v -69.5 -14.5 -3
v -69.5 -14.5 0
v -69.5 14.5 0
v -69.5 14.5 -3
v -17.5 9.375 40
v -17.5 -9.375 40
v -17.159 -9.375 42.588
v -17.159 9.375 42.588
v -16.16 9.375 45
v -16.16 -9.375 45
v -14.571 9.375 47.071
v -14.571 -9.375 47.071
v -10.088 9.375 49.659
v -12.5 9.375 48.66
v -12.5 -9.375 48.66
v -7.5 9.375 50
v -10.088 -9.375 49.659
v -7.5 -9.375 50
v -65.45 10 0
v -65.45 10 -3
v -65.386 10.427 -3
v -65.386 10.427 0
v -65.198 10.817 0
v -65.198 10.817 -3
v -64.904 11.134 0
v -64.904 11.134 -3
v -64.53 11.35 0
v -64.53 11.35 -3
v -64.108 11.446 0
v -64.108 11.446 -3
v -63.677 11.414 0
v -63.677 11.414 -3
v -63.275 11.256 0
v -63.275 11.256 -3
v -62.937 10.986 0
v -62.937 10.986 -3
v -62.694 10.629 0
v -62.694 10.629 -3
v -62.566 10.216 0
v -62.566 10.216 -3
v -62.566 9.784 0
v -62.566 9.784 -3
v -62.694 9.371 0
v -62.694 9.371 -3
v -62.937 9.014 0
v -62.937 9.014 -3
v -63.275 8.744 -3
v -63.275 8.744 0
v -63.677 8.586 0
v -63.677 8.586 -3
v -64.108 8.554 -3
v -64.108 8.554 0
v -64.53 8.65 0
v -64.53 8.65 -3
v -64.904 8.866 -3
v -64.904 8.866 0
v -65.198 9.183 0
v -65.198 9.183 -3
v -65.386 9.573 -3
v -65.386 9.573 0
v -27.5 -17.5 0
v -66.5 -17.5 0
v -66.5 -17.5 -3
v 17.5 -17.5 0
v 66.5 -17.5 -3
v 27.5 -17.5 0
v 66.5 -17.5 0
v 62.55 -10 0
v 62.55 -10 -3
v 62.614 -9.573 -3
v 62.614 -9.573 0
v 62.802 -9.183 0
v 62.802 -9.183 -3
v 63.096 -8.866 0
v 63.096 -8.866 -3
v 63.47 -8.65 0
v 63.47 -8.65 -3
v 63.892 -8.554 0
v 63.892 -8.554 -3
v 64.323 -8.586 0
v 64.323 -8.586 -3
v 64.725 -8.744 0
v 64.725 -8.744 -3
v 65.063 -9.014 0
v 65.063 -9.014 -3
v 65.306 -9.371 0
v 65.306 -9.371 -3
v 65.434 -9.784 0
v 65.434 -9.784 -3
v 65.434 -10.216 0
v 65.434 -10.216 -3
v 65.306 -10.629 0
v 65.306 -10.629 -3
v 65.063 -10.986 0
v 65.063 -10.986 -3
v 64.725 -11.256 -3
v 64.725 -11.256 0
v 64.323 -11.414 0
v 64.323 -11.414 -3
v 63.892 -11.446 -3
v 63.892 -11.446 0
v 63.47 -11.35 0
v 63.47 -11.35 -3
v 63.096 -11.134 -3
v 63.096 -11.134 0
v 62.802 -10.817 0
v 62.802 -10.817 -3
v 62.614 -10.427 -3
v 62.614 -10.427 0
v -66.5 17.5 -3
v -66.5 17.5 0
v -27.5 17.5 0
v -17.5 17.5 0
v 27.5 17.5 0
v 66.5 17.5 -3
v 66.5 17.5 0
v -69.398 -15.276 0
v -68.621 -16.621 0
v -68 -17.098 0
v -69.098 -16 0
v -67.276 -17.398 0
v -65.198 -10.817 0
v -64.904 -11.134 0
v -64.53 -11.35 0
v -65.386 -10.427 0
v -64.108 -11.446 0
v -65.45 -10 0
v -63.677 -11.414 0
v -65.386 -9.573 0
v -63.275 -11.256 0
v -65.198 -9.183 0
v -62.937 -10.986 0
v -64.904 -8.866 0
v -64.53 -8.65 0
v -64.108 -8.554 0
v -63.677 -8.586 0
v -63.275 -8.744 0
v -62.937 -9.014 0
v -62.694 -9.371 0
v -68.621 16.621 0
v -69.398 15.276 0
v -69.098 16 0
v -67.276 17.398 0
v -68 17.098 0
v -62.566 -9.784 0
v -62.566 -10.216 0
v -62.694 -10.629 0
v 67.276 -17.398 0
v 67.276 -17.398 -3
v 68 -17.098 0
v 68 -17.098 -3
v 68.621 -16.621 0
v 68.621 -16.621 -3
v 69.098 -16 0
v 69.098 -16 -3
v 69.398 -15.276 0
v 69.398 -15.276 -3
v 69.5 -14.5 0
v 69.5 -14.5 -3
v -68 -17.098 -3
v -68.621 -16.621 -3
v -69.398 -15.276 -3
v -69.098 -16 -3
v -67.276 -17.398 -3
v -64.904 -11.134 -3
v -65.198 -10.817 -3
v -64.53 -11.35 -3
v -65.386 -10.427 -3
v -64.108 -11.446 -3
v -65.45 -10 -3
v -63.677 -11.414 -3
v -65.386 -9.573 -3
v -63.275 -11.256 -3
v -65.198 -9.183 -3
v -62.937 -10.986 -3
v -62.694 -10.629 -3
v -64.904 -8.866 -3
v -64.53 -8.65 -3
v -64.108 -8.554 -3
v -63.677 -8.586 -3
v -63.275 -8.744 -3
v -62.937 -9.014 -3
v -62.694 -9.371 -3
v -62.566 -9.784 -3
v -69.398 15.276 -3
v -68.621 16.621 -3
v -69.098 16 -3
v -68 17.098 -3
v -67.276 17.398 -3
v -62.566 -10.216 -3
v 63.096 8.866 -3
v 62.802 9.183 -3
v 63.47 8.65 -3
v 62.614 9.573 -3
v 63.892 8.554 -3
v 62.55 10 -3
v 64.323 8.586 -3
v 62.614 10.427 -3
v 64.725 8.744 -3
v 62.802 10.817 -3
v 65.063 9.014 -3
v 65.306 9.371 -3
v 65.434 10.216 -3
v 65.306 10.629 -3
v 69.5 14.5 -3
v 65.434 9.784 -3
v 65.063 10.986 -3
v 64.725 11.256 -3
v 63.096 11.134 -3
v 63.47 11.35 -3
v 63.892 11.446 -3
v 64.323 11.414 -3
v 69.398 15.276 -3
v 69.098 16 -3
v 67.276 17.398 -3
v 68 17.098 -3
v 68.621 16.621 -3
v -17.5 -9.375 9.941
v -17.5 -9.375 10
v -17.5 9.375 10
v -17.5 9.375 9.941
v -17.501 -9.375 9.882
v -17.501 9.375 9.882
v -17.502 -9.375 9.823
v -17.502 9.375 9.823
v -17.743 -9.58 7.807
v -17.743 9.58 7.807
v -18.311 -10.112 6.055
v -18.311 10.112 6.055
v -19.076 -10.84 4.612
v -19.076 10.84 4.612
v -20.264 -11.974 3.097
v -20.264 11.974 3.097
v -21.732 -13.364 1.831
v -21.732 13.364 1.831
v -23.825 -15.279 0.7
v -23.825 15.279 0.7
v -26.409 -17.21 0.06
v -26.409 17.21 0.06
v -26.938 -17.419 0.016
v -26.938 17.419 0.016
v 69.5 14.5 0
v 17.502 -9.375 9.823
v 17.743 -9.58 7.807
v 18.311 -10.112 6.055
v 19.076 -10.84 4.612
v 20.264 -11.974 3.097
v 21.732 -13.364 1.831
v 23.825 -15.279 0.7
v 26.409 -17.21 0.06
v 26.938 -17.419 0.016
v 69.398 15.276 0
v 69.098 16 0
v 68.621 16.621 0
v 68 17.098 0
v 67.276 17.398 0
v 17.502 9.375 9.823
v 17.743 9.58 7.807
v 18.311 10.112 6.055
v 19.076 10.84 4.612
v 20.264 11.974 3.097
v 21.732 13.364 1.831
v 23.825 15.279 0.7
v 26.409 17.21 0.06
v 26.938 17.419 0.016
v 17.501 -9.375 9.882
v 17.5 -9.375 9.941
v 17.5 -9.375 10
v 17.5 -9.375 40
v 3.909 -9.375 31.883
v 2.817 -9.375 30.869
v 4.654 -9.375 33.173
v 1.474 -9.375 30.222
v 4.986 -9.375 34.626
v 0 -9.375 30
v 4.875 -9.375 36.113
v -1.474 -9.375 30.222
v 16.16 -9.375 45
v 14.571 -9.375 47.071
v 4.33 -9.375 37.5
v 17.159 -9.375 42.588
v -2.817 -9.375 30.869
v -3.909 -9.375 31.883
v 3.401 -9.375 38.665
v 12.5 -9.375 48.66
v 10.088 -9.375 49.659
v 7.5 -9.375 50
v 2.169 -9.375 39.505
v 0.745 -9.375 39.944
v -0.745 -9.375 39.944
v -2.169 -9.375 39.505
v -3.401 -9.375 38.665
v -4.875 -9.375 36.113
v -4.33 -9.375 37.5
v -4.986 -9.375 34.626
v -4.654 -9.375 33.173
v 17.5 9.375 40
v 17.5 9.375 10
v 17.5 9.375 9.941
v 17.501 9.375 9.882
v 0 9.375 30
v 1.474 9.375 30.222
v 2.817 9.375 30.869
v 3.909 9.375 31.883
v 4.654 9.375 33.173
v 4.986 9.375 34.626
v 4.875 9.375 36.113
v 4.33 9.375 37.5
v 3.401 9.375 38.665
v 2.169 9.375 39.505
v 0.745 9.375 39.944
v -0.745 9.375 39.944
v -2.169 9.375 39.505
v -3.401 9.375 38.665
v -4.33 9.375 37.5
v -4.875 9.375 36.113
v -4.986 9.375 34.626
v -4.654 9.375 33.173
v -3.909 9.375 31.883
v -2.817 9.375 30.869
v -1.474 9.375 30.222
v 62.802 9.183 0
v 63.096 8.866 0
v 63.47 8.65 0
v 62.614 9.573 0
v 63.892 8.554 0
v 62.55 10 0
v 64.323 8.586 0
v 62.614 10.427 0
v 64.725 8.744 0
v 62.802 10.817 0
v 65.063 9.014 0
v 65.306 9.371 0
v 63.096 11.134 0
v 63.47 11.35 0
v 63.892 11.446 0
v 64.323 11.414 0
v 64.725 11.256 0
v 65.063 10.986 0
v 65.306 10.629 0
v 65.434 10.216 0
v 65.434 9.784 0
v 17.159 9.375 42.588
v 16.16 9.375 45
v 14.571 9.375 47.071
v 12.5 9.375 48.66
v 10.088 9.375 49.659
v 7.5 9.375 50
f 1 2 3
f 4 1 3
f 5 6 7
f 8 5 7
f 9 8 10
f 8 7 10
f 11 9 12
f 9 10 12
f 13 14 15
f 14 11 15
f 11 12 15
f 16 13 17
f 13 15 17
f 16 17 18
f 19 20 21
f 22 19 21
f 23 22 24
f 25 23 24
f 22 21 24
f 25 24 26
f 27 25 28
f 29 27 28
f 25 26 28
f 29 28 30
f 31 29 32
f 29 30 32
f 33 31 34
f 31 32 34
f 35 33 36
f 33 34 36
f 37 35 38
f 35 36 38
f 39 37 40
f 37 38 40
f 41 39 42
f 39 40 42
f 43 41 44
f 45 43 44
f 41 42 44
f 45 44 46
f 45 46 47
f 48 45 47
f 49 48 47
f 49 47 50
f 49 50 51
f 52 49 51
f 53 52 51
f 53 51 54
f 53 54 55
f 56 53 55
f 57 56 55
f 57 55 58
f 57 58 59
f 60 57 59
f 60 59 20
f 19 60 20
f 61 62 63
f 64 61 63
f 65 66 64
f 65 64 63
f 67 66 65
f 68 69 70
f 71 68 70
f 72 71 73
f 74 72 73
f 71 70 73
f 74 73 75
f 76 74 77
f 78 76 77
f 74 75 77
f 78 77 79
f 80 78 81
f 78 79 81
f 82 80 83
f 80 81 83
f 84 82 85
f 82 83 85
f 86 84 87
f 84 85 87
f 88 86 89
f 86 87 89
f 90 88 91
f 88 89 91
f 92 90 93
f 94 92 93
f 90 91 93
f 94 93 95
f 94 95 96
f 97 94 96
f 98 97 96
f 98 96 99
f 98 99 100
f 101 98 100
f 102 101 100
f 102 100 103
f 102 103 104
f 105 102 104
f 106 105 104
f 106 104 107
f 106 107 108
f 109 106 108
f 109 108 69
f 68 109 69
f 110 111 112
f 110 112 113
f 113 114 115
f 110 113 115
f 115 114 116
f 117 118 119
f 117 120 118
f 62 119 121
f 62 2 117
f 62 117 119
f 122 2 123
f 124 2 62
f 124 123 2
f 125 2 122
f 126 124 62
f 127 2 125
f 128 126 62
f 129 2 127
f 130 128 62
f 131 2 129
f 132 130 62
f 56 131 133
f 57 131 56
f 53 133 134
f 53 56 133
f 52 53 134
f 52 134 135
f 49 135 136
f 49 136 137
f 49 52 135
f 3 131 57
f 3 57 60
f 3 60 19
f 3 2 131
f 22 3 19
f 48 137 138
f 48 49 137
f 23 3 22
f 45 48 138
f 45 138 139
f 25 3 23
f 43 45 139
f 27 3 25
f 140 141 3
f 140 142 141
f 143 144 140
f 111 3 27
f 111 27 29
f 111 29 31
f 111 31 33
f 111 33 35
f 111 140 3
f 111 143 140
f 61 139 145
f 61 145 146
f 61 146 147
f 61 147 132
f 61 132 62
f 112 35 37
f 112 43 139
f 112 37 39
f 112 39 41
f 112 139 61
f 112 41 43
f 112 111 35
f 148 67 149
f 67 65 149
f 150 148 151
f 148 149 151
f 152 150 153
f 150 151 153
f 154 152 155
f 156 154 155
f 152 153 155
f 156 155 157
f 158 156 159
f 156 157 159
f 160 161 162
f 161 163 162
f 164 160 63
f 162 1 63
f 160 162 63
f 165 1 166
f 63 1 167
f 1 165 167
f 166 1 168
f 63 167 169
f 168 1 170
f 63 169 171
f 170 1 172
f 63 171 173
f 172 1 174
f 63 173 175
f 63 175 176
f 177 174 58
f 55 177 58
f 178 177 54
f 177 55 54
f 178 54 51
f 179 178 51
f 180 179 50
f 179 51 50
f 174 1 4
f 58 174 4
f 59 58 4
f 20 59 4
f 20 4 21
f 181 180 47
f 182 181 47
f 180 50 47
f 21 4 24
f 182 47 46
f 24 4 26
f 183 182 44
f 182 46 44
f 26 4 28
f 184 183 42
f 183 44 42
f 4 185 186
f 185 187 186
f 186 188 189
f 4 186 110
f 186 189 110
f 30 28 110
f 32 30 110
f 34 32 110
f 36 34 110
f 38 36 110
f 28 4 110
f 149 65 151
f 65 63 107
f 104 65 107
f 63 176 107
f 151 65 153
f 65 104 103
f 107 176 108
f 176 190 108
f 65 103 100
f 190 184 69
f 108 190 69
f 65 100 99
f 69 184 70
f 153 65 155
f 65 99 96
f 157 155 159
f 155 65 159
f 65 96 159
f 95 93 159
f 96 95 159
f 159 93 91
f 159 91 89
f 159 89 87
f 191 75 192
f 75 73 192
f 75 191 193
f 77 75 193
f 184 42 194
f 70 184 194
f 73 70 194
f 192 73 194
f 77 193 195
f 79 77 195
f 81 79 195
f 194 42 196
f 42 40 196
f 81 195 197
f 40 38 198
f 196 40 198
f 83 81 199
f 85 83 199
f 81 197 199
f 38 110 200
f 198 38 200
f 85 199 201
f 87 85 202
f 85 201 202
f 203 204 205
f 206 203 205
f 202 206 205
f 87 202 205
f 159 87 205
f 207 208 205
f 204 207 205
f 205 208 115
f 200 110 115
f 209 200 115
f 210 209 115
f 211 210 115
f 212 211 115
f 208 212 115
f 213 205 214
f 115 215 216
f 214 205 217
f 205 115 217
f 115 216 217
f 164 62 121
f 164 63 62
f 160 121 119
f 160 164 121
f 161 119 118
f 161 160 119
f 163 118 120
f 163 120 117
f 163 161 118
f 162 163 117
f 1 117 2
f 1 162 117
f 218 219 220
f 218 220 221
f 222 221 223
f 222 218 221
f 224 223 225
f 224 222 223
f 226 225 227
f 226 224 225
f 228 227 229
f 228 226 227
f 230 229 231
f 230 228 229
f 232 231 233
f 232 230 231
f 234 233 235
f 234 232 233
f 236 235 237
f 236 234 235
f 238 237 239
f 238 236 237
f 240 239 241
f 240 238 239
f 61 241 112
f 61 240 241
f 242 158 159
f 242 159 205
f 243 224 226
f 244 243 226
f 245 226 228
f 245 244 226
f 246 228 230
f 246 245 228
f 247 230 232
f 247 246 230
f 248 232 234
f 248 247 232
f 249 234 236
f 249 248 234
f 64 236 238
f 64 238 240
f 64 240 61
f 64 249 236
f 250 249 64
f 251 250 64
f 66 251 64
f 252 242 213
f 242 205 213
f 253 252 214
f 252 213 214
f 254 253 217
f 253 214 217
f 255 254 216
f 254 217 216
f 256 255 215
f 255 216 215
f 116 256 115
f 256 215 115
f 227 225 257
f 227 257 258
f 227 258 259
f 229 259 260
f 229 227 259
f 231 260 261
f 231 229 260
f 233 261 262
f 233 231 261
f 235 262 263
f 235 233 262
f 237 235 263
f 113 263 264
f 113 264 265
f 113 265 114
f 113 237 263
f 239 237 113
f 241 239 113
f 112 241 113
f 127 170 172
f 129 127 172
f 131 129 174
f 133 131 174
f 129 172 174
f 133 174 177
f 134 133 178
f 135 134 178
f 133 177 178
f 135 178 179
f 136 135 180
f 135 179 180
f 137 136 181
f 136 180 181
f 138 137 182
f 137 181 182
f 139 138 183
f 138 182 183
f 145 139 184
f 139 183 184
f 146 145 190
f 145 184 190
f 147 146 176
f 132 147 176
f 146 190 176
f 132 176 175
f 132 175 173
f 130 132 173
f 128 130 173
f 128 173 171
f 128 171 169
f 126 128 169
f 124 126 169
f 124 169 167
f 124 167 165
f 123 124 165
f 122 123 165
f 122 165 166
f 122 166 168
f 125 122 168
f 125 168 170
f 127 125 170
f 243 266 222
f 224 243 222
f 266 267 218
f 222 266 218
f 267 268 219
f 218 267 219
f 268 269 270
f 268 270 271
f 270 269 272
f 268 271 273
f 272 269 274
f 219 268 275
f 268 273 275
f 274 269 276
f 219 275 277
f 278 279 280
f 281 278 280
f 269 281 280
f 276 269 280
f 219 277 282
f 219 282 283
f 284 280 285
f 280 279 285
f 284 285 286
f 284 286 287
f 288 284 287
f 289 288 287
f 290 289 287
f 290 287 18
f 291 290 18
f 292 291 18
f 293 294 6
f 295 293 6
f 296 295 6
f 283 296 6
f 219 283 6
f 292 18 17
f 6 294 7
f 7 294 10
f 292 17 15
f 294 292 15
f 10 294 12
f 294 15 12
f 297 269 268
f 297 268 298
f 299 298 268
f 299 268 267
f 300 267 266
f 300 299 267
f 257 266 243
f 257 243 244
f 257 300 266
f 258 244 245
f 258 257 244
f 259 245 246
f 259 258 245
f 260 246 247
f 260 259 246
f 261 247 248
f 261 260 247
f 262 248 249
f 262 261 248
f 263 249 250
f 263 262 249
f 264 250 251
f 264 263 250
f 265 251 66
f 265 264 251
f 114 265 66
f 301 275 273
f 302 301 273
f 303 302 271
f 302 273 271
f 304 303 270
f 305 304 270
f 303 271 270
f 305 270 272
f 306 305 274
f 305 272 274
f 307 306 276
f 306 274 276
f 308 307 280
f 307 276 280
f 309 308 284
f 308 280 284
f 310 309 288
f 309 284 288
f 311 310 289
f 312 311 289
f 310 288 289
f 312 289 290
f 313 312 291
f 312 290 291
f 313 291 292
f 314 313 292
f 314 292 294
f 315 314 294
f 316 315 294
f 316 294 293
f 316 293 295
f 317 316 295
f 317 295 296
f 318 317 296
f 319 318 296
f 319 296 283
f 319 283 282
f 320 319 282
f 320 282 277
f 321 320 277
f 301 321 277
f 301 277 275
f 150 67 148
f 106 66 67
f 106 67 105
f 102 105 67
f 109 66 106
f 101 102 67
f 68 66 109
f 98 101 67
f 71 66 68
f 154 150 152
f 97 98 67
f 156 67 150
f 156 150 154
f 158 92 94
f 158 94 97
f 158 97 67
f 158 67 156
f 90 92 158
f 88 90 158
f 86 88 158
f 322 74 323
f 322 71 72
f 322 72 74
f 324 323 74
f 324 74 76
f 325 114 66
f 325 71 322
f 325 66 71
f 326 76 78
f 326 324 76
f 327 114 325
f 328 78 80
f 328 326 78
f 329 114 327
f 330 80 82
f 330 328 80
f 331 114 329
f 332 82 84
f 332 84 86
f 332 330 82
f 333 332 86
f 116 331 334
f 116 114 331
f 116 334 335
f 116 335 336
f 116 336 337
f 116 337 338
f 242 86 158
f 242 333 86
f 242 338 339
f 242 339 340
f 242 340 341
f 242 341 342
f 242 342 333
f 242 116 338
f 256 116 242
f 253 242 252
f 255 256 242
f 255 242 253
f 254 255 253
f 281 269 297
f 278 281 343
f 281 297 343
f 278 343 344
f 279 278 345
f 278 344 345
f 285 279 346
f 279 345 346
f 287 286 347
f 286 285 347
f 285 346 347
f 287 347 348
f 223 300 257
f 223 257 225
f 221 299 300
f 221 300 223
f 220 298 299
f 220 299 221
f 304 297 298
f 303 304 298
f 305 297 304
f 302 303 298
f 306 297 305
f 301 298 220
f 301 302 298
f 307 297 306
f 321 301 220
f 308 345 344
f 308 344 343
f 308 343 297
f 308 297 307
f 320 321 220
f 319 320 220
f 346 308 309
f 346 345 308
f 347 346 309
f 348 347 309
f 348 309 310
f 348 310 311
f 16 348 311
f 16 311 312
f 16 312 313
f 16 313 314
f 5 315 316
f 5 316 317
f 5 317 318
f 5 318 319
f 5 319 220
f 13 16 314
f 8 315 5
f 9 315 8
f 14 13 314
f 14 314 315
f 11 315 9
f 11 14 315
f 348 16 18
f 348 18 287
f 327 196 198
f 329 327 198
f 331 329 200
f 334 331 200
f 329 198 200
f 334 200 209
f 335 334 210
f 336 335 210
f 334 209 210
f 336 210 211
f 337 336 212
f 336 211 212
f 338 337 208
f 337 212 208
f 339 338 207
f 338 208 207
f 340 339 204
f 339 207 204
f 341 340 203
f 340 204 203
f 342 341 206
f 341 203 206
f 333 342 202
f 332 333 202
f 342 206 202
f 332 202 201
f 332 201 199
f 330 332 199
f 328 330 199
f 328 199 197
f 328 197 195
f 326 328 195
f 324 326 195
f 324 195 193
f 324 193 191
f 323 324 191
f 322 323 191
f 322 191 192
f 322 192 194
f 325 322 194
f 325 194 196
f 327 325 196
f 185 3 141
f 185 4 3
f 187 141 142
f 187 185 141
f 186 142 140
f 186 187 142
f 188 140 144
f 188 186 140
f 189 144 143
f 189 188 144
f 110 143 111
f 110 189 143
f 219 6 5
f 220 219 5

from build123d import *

# Parameters (mm, degrees)
ESQUISSE7_W             = 139
ESQUISSE7_H             = 35
BOSS_EXTRU_1_DEPTH      = 3
ESQUISSE8_W             = 35
ESQUISSE8_H             = 18.75
BOSS_EXTRU_2_DEPTH      = 50
CONG_1_R                = 10
D_GAGEMENT_M2_52_D      = 2.9
ESQUISSE9_R             = 5
ENL_V_MAT_EXTRU_2_DEPTH = 90.73581019
CONG_2_R                = 3


with BuildPart() as part:
    # Esquisse7 → Boss.-Extru.1 (new body)
    with BuildSketch(Plane.XY):
        Rectangle(ESQUISSE7_W, ESQUISSE7_H)
    extrude(amount=-BOSS_EXTRU_1_DEPTH)

    # Esquisse8 → Boss.-Extru.2 (add)
    with BuildSketch(Plane.XY):
        Rectangle(ESQUISSE8_W, ESQUISSE8_H)
    extrude(amount=BOSS_EXTRU_2_DEPTH)

    # Congé1
    # the kernel refuses this fillet: 10 mm, written as the material it adds along each edge
    with BuildSketch(Plane(origin=(17.5, 9.375, 0), x_dir=(1, 0, 0), z_dir=(0, -1, 0)), Plane(origin=(-17.5, -9.375, 0), x_dir=(-1, 0, 0), z_dir=(0, 1, 0))) as cong_1_piece_1:
        with BuildLine():
            CenterArc((CONG_1_R, CONG_1_R), CONG_1_R, 180, 90)
            Line((0, CONG_1_R), (0, 0))
            Line((0, 0), (CONG_1_R, 0))
        make_face()
    extrude(amount=18.75)
    with BuildSketch(Plane(origin=(-17.5, 9.375, 0), x_dir=(0, 1, 0), z_dir=(1, 0, 0)), Plane(origin=(17.5, -9.375, 0), x_dir=(0, -1, 0), z_dir=(-1, 0, 0))) as cong_1_piece_2:
        with BuildLine():
            CenterArc((10, 9.822646028), CONG_1_R, 180, 79.193077125)
            Line((0, 9.822646028), (0, 0))
            Line((0, 0), (8.125, 0))
        make_face()
    extrude(amount=35)
    with BuildSketch(Plane(origin=(-17.5, 9.375, 0), x_dir=(0, 1, 0), z_dir=(1, 0, 0))) as cong_1_piece_3a_section:
        with BuildLine():
            CenterArc((10, 9.822646028), CONG_1_R, 180, 79.193077125)
            Line((0, 9.822646028), (0, 0))
            Line((0, 0), (8.125, 0))
        make_face()
    cong_1_piece_3a = extrude(amount=59.556615071, mode=Mode.PRIVATE)
    cong_1_piece_3a = split(cong_1_piece_3a, bisect_by=Plane(origin=(17.5, 9.375, 0), z_dir=(1, 0, 0)), keep=Keep.TOP, mode=Mode.PRIVATE)
    with BuildSketch(Plane(origin=(17.5, 34.375, 0), x_dir=(1, 0, 0), z_dir=(0, -1, 0))) as cong_1_piece_3b_section:
        with BuildLine():
            CenterArc((CONG_1_R, CONG_1_R), CONG_1_R, 180, 90)
            Line((0, CONG_1_R), (0, 0))
            Line((0, 0), (CONG_1_R, 0))
        make_face()
    cong_1_piece_3b = extrude(amount=43.75, mode=Mode.PRIVATE)
    cong_1_piece_3b = split(cong_1_piece_3b, bisect_by=Plane(origin=(17.5, 17.5, 0), z_dir=(0, -1, 0)), keep=Keep.TOP, mode=Mode.PRIVATE)
    cong_1_piece_3b = split(cong_1_piece_3b, bisect_by=Plane(origin=(17.5, 9.375, 0), z_dir=(0, 1, 0)), keep=Keep.TOP, mode=Mode.PRIVATE)
    cong_1_piece_3 = cong_1_piece_3a & cong_1_piece_3b
    add(cong_1_piece_3)
    with BuildSketch(Plane(origin=(17.5, 9.375, 0), x_dir=(1, 0, 0), z_dir=(0, -1, 0))) as cong_1_piece_4a_section:
        with BuildLine():
            CenterArc((CONG_1_R, CONG_1_R), CONG_1_R, 180, 90)
            Line((0, CONG_1_R), (0, 0))
            Line((0, 0), (CONG_1_R, 0))
        make_face()
    cong_1_piece_4a = extrude(amount=43.75, mode=Mode.PRIVATE)
    cong_1_piece_4a = split(cong_1_piece_4a, bisect_by=Plane(origin=(17.5, -17.5, 0), z_dir=(0, 1, 0)), keep=Keep.TOP, mode=Mode.PRIVATE)
    cong_1_piece_4a = split(cong_1_piece_4a, bisect_by=Plane(origin=(17.5, -9.375, 0), z_dir=(0, -1, 0)), keep=Keep.TOP, mode=Mode.PRIVATE)
    with BuildSketch(Plane(origin=(42.056615071, -9.375, 0), x_dir=(0, -1, 0), z_dir=(-1, 0, 0))) as cong_1_piece_4b_section:
        with BuildLine():
            CenterArc((10, 9.822646028), CONG_1_R, 180, 79.193077125)
            Line((0, 9.822646028), (0, 0))
            Line((0, 0), (8.125, 0))
        make_face()
    cong_1_piece_4b = extrude(amount=59.556615071, mode=Mode.PRIVATE)
    cong_1_piece_4b = split(cong_1_piece_4b, bisect_by=Plane(origin=(17.5, -9.375, 0), z_dir=(1, 0, 0)), keep=Keep.TOP, mode=Mode.PRIVATE)
    cong_1_piece_4 = cong_1_piece_4a & cong_1_piece_4b
    add(cong_1_piece_4)
    with BuildSketch(Plane(origin=(-42.056615071, 9.375, 0), x_dir=(0, 1, 0), z_dir=(1, 0, 0))) as cong_1_piece_5a_section:
        with BuildLine():
            CenterArc((10, 9.822646028), CONG_1_R, 180, 79.193077125)
            Line((0, 9.822646028), (0, 0))
            Line((0, 0), (8.125, 0))
        make_face()
    cong_1_piece_5a = extrude(amount=59.556615071, mode=Mode.PRIVATE)
    cong_1_piece_5a = split(cong_1_piece_5a, bisect_by=Plane(origin=(-17.5, 9.375, 0), z_dir=(-1, 0, 0)), keep=Keep.TOP, mode=Mode.PRIVATE)
    with BuildSketch(Plane(origin=(-17.5, -9.375, 0), x_dir=(-1, 0, 0), z_dir=(0, 1, 0))) as cong_1_piece_5b_section:
        with BuildLine():
            CenterArc((CONG_1_R, CONG_1_R), CONG_1_R, 180, 90)
            Line((0, CONG_1_R), (0, 0))
            Line((0, 0), (CONG_1_R, 0))
        make_face()
    cong_1_piece_5b = extrude(amount=43.75, mode=Mode.PRIVATE)
    cong_1_piece_5b = split(cong_1_piece_5b, bisect_by=Plane(origin=(-17.5, 17.5, 0), z_dir=(0, -1, 0)), keep=Keep.TOP, mode=Mode.PRIVATE)
    cong_1_piece_5b = split(cong_1_piece_5b, bisect_by=Plane(origin=(-17.5, 9.375, 0), z_dir=(0, 1, 0)), keep=Keep.TOP, mode=Mode.PRIVATE)
    cong_1_piece_5 = cong_1_piece_5a & cong_1_piece_5b
    add(cong_1_piece_5)
    with BuildSketch(Plane(origin=(17.5, -9.375, 0), x_dir=(0, -1, 0), z_dir=(-1, 0, 0))) as cong_1_piece_6a_section:
        with BuildLine():
            CenterArc((10, 9.822646028), CONG_1_R, 180, 79.193077125)
            Line((0, 9.822646028), (0, 0))
            Line((0, 0), (8.125, 0))
        make_face()
    cong_1_piece_6a = extrude(amount=59.556615071, mode=Mode.PRIVATE)
    cong_1_piece_6a = split(cong_1_piece_6a, bisect_by=Plane(origin=(-17.5, -9.375, 0), z_dir=(-1, 0, 0)), keep=Keep.TOP, mode=Mode.PRIVATE)
    with BuildSketch(Plane(origin=(-17.5, -34.375, 0), x_dir=(-1, 0, 0), z_dir=(0, 1, 0))) as cong_1_piece_6b_section:
        with BuildLine():
            CenterArc((CONG_1_R, CONG_1_R), CONG_1_R, 180, 90)
            Line((0, CONG_1_R), (0, 0))
            Line((0, 0), (CONG_1_R, 0))
        make_face()
    cong_1_piece_6b = extrude(amount=43.75, mode=Mode.PRIVATE)
    cong_1_piece_6b = split(cong_1_piece_6b, bisect_by=Plane(origin=(-17.5, -17.5, 0), z_dir=(0, 1, 0)), keep=Keep.TOP, mode=Mode.PRIVATE)
    cong_1_piece_6b = split(cong_1_piece_6b, bisect_by=Plane(origin=(-17.5, -9.375, 0), z_dir=(0, -1, 0)), keep=Keep.TOP, mode=Mode.PRIVATE)
    cong_1_piece_6 = cong_1_piece_6a & cong_1_piece_6b
    add(cong_1_piece_6)
    # the kernel refuses this fillet: 10 mm, written as the material it takes off along each edge
    with BuildSketch(Plane(origin=(17.5, 34.375, 50), x_dir=(-1, 0, 0), z_dir=(0, -1, 0))) as cong_1_2_piece_1:
        with BuildLine():
            CenterArc((CONG_1_R, CONG_1_R), CONG_1_R, 180, 90)
            Line((0, CONG_1_R), (0, 0))
            Line((0, 0), (CONG_1_R, 0))
        make_face()
    extrude(amount=68.75, mode=Mode.SUBTRACT)
    with BuildSketch(Plane(origin=(-17.5, -34.375, 50), x_dir=(0, 0, -1), z_dir=(0, 1, 0))) as cong_1_2_piece_2:
        with BuildLine():
            CenterArc((CONG_1_R, -CONG_1_R), CONG_1_R, 90, 90)
            Line((0, -CONG_1_R), (0, 0))
            Line((0, 0), (CONG_1_R, 0))
        make_face()
    extrude(amount=68.75, mode=Mode.SUBTRACT)

    # Dégagement M2.52 (through all)
    with Locations(Plane.XY):
        with Locations((64, -10), (64, 10), (-64, -10), (-64, 10)):
            Hole(D_GAGEMENT_M2_52_D / 2)

    # Esquisse9 → Enlèv. mat.-Extru.2 (cut, through all)
    with BuildSketch(Plane(origin=(0, -9.375, 0), x_dir=(-1, 0, 0), z_dir=(0, -1, 0))):
        with Locations(Location((0, -35, 0), (0, 0, 90))):
            Circle(ESQUISSE9_R)
    extrude(amount=-ENL_V_MAT_EXTRU_2_DEPTH, mode=Mode.SUBTRACT)

    # Congé2
    cong_2_edges = [part.edges().sort_by_distance(p)[0] for p in [
        (-69.5, 17.5, -1.5),
        (69.5, 17.5, -1.5),
        (69.5, -17.5, -1.5),
        (-69.5, -17.5, -1.5),
    ]]
    fillet(cong_2_edges, radius=CONG_2_R)


solid = part.part
